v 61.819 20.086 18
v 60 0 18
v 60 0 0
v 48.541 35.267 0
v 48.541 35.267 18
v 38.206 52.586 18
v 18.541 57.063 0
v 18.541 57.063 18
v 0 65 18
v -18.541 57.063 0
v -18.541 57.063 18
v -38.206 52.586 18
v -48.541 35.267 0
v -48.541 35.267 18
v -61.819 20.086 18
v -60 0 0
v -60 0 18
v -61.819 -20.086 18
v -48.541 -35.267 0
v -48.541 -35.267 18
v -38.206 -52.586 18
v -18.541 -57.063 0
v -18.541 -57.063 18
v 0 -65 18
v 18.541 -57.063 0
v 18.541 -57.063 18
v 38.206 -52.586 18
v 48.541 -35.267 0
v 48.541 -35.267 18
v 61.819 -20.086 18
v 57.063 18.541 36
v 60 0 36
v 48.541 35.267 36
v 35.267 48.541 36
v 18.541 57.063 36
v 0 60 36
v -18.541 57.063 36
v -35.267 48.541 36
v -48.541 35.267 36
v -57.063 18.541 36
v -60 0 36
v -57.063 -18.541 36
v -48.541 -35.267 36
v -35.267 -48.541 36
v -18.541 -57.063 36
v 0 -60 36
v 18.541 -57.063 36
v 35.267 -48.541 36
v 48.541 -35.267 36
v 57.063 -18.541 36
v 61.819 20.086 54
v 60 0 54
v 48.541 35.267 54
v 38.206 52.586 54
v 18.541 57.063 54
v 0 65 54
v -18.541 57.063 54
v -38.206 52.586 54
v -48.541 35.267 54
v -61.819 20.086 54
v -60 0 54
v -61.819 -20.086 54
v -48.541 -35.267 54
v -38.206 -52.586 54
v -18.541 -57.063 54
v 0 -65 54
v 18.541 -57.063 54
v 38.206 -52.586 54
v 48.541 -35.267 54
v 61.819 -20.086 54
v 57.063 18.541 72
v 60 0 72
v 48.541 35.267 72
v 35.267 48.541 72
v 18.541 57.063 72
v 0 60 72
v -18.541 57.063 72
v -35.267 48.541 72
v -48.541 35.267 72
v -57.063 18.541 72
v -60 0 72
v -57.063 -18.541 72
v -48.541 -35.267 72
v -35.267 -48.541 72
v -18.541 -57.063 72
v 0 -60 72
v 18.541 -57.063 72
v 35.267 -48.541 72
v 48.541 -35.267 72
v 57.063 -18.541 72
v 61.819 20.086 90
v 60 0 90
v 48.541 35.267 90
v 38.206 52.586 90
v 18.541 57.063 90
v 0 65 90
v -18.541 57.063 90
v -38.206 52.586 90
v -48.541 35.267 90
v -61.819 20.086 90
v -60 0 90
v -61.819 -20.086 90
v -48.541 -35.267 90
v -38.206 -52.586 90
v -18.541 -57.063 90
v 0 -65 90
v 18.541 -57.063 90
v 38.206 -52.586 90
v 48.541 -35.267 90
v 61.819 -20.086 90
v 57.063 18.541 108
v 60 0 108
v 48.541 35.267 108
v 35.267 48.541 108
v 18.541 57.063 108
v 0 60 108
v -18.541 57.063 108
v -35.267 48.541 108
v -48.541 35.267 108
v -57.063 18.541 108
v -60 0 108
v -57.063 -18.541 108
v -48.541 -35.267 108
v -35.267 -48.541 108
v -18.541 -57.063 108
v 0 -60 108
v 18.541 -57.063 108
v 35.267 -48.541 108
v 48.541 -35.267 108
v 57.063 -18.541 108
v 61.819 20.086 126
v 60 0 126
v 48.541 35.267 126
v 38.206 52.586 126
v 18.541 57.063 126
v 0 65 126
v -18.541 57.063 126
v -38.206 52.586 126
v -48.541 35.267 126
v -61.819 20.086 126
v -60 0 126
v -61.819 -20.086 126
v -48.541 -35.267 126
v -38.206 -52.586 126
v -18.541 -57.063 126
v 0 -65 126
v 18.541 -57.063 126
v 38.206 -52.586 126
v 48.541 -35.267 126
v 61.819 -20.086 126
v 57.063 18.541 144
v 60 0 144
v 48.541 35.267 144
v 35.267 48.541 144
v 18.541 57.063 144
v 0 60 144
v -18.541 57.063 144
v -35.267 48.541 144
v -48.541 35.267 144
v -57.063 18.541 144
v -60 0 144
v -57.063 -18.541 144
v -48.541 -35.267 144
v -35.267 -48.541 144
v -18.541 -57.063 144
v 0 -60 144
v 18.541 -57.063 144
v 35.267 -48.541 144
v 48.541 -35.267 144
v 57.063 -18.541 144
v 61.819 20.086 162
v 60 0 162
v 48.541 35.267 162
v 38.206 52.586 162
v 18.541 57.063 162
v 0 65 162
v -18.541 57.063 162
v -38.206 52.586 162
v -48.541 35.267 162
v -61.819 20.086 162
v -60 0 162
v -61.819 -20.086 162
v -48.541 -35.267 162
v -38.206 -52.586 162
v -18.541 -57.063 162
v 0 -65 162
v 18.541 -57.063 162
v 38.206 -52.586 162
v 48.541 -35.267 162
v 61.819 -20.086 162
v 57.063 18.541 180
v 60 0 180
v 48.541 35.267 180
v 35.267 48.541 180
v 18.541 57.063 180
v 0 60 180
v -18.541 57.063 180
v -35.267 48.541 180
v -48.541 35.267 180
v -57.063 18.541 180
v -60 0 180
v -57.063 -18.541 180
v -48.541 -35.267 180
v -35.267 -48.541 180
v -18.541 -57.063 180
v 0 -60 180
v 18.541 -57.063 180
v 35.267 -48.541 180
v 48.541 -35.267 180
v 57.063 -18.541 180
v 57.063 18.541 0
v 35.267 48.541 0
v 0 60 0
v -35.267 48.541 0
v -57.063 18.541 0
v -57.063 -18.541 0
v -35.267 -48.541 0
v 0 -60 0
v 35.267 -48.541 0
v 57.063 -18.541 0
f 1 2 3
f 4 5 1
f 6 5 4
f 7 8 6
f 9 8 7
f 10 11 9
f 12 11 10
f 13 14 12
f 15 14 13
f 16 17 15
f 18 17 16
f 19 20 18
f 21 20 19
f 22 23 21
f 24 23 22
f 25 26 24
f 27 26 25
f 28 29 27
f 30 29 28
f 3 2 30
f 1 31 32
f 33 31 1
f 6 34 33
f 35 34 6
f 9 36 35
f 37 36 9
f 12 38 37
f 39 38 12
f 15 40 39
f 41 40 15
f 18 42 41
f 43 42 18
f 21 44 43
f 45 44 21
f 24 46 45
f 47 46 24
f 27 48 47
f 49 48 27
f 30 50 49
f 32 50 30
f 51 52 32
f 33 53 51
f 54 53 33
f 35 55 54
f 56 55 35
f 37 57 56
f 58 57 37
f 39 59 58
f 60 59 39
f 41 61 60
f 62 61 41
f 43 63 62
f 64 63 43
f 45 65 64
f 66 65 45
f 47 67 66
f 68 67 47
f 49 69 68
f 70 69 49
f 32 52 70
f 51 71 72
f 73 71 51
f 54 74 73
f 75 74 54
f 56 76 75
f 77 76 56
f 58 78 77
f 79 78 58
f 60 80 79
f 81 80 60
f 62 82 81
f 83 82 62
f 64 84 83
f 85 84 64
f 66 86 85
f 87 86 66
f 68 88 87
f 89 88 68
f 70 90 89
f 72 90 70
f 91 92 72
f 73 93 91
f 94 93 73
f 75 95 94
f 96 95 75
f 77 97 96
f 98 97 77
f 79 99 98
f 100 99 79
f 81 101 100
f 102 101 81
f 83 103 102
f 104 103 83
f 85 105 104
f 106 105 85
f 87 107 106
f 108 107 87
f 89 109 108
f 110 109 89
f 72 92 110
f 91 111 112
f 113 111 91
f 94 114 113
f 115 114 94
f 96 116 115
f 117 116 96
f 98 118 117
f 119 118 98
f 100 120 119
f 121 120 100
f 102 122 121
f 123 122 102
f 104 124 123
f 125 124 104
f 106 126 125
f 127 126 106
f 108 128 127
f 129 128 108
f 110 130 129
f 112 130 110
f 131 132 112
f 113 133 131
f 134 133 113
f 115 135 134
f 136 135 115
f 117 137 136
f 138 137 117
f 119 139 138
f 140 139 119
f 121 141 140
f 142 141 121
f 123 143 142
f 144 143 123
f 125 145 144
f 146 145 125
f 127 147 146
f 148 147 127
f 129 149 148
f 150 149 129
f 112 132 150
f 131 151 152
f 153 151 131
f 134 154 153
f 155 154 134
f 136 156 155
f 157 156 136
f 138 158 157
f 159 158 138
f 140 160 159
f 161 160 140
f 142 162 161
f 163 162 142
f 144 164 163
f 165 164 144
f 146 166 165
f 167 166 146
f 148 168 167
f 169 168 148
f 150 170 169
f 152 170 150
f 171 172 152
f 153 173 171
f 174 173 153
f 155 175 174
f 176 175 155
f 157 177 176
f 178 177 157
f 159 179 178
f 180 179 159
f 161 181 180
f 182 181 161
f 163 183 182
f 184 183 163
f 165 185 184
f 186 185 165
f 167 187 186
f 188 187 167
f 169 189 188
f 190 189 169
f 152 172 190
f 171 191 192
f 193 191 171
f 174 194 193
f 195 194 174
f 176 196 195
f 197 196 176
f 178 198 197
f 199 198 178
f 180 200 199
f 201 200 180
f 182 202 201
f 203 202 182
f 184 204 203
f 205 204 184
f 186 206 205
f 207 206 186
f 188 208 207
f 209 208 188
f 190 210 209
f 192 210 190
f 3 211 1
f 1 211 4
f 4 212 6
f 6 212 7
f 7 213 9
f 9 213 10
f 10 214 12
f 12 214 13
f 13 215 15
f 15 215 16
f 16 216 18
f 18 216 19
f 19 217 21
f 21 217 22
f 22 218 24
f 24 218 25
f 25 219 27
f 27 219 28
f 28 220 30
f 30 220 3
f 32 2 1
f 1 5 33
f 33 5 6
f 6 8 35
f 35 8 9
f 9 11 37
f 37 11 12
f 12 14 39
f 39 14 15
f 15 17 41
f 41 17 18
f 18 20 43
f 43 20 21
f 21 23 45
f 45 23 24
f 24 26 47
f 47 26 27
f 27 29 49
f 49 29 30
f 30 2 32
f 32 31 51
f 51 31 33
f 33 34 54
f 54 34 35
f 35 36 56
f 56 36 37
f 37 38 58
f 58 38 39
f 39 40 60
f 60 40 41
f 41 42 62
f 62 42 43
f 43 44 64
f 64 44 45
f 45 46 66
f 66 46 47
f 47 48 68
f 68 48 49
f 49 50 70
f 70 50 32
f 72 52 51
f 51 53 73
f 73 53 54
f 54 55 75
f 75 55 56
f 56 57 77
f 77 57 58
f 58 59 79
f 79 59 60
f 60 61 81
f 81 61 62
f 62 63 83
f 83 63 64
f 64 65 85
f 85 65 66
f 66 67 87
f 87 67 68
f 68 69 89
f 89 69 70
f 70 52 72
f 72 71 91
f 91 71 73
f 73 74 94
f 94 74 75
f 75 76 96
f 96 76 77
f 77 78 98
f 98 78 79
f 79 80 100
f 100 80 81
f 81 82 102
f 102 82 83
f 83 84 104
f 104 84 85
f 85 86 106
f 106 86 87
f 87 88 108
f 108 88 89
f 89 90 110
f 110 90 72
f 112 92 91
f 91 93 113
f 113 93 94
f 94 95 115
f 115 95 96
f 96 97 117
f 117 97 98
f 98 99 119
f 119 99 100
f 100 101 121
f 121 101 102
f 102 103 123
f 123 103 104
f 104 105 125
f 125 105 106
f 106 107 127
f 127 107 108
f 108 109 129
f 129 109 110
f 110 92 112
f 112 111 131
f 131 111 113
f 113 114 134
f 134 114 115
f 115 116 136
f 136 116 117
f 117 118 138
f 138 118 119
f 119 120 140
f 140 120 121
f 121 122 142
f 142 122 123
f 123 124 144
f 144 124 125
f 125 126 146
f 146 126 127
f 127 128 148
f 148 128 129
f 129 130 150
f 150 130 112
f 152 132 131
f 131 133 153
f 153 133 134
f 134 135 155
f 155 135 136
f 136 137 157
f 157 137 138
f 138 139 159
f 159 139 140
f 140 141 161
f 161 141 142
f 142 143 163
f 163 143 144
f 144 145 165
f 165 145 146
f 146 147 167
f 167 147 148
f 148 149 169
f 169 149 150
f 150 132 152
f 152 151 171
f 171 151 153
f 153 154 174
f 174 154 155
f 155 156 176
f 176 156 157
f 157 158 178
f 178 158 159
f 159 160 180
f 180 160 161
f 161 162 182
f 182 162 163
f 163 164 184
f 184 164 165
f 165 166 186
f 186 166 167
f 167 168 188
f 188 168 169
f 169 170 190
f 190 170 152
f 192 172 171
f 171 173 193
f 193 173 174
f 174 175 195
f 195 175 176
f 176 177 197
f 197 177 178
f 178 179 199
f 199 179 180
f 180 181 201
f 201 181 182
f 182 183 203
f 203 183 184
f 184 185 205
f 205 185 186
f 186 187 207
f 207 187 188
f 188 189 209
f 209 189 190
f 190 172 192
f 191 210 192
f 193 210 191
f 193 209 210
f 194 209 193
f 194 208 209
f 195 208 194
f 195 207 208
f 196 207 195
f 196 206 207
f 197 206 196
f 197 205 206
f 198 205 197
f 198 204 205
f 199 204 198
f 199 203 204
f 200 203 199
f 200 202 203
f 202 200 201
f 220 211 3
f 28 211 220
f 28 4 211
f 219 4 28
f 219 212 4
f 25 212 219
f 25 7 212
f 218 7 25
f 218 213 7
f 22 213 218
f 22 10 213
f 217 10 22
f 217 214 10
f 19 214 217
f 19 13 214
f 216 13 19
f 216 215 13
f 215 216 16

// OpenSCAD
/*

LOW POLY VASE FACTORY

Fernando Jerez 2017
License: CC


*/

// Style / Shape
shape = "cylinder"; // [cylinder: Cylinder, vase1:Vase, vase2:Vase 2, glass: Glass, bowl:Bowl, cup1: Cup, cup2: Cup 2, cone: Cone ]

// Radius 
radius= 60; // [20:100]

// Spike size
spikes = 5; //[-20:20]

// Number of Sides
sides = 20; // [3:30]

// Number of Levels
levels = 10; // [3:30]

// Twisting factor
twist = 0; //[-1:0.1:1]

/* [Hidden] */

vase();

module vase(){

altura = 180 - 180%levels; // z-steps
step = floor(180/levels); // resolution in Z (1 is the best and slower)

 
stepc = 360/sides; // Don't touch!

puntos = [
    for(z = [0:step:altura])
        for(i = [0:stepc:359])
            let(

                
                // shape 
                zrad  = (shape=="cylinder") ? 1 :
                        (shape=="vase1")    ? 0.7+ 0.4*sin(z*1.9) :
                        (shape=="vase2")    ? 0.6+ 0.4*pow(sin(z+60),2) :
                        (shape=="glass")    ? 0.6+ 0.4*pow(sin(z*0.7-30),2) :
                        (shape=="cup1")      ? 0.65+ 0.3 * cos(z*2+35) :
                        (shape=="cup2")     ? 0.6+ 0.35*cos(180 - z+50)*sin(180-z*2.5+45) :
                        (shape=="bowl")     ? 0.6+ 0.4 * sin(z*0.5) :
                        cos(z*0.5),
        
                rad2  = ((z/step)%2==1 && (i/stepc)%2==1)?spikes:0,
                g = z*twist,
                
                // vertex
                r     = rad2+  zrad* radius, 
                px    = r*cos(i+g),
                py    = r*sin(i+g)
        
            )
        
            [px,py,z]
];
        
caras = concat(
    [
    for(z = [0:(altura/step)-1])
        for(s = [0:sides-1])
            let(
                // clockwise from left-down corner
                f1 = s + sides*z,
                f2 = s + sides*(z+1),
                f3 = ((s+1) % sides) + sides*(z+1),
                f4 = ((s+1) % sides) + sides*z
            )
        
            ( (s+z)%2==0) ? [f1,f2,f3] : [f2,f3,f4]
 
    ],
    [
    for(z = [0:(altura/step)-1])
        for(s = [0:sides-1])
            let(
                // clockwise from left-down corner
                f1 = s + sides*z,
                f2 = s + sides*(z+1),
                f3 = ((s+1) % sides) + sides*(z+1),
                f4 = ((s+1) % sides) + sides*z
            )
            ( (s+z)%2==0) ? [f3,f4,f1] : [f4,f1,f2]
         
    ],
   
    (shape!="cone")?[[ for(s = [sides-1:-1:0]) (altura/step)*(sides) + s]]:[], //top
    [[ for(s = [0:sides-1]) s]] //bottom
        
 );       
 scale([1,1,(shape=="bowl")?0.33:1])    
 polyhedron (points=puntos,faces = caras);

}
